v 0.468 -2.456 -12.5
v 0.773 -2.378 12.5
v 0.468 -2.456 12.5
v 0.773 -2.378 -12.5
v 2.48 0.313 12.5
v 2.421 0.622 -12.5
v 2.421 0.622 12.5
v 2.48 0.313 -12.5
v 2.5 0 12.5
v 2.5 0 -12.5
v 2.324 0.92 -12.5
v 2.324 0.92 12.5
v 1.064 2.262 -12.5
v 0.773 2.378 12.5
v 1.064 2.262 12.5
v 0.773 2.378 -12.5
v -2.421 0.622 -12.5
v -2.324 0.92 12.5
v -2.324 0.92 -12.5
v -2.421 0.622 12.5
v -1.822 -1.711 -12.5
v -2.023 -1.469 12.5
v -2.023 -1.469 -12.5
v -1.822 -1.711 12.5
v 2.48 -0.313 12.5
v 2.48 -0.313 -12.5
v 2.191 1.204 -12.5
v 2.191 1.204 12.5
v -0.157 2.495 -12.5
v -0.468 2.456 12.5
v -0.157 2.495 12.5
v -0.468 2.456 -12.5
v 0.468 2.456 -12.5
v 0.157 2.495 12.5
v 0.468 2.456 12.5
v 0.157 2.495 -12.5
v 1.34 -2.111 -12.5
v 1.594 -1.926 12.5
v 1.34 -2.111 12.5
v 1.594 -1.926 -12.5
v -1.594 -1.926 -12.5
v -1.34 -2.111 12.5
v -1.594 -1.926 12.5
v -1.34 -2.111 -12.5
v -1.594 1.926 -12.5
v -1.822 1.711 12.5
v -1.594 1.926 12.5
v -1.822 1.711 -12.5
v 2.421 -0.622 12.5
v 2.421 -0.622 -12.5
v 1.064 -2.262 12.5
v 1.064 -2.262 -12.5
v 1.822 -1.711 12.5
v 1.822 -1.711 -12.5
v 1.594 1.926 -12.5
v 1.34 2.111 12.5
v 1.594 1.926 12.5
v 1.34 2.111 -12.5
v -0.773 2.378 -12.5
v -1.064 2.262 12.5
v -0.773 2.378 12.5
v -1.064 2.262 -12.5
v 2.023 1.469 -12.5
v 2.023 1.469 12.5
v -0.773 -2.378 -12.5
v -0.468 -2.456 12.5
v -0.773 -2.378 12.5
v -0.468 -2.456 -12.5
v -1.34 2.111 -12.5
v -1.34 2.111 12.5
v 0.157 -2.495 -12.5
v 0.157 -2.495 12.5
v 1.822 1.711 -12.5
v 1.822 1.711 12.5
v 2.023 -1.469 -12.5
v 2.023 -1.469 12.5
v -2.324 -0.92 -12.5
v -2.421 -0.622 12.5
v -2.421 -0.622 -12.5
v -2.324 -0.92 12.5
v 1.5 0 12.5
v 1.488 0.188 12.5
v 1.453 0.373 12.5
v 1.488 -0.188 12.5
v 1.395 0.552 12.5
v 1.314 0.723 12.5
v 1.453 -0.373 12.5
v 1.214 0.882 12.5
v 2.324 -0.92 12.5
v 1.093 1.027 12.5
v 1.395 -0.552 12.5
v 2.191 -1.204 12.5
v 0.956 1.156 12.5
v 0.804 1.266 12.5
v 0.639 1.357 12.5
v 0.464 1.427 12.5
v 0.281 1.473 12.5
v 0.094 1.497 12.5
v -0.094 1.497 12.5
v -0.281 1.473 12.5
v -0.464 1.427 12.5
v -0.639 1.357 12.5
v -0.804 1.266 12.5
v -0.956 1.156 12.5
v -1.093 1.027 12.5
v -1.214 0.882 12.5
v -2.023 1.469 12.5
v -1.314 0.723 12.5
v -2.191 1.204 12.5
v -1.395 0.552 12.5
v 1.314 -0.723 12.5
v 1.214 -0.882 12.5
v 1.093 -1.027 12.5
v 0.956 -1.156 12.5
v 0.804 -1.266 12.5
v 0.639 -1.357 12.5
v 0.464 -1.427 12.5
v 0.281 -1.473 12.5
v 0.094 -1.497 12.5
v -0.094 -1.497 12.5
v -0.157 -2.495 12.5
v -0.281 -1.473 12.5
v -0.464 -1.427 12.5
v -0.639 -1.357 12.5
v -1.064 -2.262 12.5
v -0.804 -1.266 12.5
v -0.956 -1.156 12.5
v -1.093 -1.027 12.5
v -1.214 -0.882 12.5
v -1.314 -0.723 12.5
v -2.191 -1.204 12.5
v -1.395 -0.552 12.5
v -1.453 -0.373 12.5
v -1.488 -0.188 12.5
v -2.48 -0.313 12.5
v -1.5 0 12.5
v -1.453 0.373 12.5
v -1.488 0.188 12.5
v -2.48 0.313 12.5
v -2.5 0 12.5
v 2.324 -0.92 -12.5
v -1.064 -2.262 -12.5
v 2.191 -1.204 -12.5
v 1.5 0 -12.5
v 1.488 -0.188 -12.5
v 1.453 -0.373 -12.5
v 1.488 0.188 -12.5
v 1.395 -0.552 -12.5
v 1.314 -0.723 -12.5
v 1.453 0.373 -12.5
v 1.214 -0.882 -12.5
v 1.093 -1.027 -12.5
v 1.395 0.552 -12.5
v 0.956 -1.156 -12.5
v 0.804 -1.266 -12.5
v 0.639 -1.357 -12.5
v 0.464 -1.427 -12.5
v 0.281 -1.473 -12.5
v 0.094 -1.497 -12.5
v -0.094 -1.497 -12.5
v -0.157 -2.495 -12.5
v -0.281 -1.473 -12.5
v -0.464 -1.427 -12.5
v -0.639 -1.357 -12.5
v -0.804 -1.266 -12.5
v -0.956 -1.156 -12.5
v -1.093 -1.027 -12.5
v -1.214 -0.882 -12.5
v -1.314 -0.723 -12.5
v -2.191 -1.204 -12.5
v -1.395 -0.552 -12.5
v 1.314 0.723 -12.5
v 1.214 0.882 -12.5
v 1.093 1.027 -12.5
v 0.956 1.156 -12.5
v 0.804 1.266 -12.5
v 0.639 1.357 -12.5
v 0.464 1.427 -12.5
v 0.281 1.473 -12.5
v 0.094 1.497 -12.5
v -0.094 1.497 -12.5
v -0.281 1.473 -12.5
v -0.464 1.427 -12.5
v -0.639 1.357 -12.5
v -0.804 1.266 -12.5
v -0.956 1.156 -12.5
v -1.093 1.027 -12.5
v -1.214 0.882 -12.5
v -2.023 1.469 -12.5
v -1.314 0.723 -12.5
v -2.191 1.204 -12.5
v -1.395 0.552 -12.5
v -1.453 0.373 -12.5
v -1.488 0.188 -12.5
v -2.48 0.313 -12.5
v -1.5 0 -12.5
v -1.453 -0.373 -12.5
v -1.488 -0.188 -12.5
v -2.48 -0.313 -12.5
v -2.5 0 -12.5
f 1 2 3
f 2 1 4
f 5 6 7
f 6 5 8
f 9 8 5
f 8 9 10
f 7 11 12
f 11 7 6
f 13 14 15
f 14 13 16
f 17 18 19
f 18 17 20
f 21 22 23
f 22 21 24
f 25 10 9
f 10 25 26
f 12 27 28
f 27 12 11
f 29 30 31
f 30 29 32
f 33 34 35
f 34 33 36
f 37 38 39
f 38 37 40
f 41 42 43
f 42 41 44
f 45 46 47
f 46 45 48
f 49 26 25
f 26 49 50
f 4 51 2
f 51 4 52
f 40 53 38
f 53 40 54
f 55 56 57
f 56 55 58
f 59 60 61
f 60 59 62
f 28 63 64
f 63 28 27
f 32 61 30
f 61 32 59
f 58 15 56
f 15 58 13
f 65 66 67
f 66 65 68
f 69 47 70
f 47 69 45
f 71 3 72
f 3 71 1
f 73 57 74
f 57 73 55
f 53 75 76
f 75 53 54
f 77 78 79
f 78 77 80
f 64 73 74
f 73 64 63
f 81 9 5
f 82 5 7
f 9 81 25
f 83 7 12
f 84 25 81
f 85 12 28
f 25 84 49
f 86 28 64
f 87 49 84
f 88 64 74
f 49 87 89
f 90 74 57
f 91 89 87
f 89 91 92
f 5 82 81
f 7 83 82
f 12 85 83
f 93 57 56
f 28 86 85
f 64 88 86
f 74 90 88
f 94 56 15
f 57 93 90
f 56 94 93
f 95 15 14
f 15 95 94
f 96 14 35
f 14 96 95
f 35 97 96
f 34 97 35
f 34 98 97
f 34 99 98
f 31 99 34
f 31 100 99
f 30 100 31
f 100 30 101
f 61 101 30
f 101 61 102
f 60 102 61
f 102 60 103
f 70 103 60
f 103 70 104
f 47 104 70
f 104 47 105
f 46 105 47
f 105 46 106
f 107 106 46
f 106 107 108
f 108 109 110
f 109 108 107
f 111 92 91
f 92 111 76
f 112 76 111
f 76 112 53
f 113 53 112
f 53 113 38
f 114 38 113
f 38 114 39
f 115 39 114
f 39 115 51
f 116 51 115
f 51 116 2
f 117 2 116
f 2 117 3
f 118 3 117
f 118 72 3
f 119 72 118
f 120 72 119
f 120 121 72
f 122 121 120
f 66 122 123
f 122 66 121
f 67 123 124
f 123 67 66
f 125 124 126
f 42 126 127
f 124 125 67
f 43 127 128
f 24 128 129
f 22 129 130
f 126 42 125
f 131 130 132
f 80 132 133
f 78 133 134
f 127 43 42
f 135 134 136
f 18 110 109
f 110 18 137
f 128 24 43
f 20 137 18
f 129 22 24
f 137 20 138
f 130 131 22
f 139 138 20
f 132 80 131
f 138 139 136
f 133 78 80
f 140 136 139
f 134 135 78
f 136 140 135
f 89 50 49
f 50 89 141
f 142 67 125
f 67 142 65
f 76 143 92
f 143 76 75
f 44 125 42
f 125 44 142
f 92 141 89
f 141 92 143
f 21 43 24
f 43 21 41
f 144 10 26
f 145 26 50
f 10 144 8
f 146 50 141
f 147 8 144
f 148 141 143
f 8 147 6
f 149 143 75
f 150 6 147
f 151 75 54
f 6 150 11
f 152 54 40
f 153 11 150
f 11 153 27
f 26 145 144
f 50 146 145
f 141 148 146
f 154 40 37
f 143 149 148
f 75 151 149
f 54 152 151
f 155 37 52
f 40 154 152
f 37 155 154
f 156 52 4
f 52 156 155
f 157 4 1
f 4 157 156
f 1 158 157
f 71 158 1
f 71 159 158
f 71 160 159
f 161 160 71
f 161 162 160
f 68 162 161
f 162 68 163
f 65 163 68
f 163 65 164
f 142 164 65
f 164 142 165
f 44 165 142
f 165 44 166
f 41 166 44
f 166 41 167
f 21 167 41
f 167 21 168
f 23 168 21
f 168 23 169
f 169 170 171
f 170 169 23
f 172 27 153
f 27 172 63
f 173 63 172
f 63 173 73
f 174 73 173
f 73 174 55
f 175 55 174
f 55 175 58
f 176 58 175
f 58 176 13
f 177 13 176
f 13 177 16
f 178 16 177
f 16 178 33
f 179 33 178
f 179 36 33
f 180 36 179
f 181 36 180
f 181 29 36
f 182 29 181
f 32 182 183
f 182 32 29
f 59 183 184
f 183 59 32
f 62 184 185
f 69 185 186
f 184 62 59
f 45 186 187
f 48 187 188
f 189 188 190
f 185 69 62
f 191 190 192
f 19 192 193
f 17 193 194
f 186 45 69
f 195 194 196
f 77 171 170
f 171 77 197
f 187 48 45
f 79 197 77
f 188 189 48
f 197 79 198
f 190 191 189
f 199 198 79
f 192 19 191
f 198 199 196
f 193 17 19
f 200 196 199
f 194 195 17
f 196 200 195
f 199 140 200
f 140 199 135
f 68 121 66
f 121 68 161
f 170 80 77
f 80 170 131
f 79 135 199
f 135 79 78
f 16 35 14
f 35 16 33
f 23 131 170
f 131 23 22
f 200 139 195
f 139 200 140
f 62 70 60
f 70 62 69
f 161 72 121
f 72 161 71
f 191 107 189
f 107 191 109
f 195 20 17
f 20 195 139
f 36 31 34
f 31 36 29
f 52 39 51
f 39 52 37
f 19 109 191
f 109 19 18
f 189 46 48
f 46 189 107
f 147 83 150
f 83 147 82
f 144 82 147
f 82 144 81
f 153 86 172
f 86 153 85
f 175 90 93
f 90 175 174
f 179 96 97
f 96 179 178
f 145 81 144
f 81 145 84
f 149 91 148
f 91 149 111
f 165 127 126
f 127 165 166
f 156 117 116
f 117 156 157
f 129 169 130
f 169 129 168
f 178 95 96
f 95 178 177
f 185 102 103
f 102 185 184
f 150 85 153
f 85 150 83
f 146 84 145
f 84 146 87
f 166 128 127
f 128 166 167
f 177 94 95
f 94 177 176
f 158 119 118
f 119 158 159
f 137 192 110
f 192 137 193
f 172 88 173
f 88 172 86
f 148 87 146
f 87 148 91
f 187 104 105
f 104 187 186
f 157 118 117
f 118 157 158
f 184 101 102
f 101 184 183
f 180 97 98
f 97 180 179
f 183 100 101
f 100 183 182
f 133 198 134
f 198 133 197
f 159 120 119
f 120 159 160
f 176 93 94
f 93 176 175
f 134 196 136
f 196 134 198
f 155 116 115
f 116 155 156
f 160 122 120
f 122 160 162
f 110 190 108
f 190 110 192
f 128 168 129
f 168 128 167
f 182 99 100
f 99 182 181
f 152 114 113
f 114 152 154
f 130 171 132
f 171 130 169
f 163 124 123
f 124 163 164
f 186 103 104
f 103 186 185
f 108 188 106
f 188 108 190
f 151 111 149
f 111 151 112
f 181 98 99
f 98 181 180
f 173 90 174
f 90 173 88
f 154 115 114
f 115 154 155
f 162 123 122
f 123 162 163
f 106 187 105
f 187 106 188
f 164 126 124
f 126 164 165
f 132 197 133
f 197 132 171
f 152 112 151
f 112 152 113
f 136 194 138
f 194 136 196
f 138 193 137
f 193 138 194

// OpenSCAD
$fn = 50;


difference() {
	union() {
		translate(v = [0, 0, -12.5000000000]) {
			cylinder(h = 25, r = 2.5000000000);
		}
	}
	union() {
		translate(v = [0, 0, -100.0000000000]) {
			cylinder(h = 200, r = 1.5000000000);
		}
	}
}
